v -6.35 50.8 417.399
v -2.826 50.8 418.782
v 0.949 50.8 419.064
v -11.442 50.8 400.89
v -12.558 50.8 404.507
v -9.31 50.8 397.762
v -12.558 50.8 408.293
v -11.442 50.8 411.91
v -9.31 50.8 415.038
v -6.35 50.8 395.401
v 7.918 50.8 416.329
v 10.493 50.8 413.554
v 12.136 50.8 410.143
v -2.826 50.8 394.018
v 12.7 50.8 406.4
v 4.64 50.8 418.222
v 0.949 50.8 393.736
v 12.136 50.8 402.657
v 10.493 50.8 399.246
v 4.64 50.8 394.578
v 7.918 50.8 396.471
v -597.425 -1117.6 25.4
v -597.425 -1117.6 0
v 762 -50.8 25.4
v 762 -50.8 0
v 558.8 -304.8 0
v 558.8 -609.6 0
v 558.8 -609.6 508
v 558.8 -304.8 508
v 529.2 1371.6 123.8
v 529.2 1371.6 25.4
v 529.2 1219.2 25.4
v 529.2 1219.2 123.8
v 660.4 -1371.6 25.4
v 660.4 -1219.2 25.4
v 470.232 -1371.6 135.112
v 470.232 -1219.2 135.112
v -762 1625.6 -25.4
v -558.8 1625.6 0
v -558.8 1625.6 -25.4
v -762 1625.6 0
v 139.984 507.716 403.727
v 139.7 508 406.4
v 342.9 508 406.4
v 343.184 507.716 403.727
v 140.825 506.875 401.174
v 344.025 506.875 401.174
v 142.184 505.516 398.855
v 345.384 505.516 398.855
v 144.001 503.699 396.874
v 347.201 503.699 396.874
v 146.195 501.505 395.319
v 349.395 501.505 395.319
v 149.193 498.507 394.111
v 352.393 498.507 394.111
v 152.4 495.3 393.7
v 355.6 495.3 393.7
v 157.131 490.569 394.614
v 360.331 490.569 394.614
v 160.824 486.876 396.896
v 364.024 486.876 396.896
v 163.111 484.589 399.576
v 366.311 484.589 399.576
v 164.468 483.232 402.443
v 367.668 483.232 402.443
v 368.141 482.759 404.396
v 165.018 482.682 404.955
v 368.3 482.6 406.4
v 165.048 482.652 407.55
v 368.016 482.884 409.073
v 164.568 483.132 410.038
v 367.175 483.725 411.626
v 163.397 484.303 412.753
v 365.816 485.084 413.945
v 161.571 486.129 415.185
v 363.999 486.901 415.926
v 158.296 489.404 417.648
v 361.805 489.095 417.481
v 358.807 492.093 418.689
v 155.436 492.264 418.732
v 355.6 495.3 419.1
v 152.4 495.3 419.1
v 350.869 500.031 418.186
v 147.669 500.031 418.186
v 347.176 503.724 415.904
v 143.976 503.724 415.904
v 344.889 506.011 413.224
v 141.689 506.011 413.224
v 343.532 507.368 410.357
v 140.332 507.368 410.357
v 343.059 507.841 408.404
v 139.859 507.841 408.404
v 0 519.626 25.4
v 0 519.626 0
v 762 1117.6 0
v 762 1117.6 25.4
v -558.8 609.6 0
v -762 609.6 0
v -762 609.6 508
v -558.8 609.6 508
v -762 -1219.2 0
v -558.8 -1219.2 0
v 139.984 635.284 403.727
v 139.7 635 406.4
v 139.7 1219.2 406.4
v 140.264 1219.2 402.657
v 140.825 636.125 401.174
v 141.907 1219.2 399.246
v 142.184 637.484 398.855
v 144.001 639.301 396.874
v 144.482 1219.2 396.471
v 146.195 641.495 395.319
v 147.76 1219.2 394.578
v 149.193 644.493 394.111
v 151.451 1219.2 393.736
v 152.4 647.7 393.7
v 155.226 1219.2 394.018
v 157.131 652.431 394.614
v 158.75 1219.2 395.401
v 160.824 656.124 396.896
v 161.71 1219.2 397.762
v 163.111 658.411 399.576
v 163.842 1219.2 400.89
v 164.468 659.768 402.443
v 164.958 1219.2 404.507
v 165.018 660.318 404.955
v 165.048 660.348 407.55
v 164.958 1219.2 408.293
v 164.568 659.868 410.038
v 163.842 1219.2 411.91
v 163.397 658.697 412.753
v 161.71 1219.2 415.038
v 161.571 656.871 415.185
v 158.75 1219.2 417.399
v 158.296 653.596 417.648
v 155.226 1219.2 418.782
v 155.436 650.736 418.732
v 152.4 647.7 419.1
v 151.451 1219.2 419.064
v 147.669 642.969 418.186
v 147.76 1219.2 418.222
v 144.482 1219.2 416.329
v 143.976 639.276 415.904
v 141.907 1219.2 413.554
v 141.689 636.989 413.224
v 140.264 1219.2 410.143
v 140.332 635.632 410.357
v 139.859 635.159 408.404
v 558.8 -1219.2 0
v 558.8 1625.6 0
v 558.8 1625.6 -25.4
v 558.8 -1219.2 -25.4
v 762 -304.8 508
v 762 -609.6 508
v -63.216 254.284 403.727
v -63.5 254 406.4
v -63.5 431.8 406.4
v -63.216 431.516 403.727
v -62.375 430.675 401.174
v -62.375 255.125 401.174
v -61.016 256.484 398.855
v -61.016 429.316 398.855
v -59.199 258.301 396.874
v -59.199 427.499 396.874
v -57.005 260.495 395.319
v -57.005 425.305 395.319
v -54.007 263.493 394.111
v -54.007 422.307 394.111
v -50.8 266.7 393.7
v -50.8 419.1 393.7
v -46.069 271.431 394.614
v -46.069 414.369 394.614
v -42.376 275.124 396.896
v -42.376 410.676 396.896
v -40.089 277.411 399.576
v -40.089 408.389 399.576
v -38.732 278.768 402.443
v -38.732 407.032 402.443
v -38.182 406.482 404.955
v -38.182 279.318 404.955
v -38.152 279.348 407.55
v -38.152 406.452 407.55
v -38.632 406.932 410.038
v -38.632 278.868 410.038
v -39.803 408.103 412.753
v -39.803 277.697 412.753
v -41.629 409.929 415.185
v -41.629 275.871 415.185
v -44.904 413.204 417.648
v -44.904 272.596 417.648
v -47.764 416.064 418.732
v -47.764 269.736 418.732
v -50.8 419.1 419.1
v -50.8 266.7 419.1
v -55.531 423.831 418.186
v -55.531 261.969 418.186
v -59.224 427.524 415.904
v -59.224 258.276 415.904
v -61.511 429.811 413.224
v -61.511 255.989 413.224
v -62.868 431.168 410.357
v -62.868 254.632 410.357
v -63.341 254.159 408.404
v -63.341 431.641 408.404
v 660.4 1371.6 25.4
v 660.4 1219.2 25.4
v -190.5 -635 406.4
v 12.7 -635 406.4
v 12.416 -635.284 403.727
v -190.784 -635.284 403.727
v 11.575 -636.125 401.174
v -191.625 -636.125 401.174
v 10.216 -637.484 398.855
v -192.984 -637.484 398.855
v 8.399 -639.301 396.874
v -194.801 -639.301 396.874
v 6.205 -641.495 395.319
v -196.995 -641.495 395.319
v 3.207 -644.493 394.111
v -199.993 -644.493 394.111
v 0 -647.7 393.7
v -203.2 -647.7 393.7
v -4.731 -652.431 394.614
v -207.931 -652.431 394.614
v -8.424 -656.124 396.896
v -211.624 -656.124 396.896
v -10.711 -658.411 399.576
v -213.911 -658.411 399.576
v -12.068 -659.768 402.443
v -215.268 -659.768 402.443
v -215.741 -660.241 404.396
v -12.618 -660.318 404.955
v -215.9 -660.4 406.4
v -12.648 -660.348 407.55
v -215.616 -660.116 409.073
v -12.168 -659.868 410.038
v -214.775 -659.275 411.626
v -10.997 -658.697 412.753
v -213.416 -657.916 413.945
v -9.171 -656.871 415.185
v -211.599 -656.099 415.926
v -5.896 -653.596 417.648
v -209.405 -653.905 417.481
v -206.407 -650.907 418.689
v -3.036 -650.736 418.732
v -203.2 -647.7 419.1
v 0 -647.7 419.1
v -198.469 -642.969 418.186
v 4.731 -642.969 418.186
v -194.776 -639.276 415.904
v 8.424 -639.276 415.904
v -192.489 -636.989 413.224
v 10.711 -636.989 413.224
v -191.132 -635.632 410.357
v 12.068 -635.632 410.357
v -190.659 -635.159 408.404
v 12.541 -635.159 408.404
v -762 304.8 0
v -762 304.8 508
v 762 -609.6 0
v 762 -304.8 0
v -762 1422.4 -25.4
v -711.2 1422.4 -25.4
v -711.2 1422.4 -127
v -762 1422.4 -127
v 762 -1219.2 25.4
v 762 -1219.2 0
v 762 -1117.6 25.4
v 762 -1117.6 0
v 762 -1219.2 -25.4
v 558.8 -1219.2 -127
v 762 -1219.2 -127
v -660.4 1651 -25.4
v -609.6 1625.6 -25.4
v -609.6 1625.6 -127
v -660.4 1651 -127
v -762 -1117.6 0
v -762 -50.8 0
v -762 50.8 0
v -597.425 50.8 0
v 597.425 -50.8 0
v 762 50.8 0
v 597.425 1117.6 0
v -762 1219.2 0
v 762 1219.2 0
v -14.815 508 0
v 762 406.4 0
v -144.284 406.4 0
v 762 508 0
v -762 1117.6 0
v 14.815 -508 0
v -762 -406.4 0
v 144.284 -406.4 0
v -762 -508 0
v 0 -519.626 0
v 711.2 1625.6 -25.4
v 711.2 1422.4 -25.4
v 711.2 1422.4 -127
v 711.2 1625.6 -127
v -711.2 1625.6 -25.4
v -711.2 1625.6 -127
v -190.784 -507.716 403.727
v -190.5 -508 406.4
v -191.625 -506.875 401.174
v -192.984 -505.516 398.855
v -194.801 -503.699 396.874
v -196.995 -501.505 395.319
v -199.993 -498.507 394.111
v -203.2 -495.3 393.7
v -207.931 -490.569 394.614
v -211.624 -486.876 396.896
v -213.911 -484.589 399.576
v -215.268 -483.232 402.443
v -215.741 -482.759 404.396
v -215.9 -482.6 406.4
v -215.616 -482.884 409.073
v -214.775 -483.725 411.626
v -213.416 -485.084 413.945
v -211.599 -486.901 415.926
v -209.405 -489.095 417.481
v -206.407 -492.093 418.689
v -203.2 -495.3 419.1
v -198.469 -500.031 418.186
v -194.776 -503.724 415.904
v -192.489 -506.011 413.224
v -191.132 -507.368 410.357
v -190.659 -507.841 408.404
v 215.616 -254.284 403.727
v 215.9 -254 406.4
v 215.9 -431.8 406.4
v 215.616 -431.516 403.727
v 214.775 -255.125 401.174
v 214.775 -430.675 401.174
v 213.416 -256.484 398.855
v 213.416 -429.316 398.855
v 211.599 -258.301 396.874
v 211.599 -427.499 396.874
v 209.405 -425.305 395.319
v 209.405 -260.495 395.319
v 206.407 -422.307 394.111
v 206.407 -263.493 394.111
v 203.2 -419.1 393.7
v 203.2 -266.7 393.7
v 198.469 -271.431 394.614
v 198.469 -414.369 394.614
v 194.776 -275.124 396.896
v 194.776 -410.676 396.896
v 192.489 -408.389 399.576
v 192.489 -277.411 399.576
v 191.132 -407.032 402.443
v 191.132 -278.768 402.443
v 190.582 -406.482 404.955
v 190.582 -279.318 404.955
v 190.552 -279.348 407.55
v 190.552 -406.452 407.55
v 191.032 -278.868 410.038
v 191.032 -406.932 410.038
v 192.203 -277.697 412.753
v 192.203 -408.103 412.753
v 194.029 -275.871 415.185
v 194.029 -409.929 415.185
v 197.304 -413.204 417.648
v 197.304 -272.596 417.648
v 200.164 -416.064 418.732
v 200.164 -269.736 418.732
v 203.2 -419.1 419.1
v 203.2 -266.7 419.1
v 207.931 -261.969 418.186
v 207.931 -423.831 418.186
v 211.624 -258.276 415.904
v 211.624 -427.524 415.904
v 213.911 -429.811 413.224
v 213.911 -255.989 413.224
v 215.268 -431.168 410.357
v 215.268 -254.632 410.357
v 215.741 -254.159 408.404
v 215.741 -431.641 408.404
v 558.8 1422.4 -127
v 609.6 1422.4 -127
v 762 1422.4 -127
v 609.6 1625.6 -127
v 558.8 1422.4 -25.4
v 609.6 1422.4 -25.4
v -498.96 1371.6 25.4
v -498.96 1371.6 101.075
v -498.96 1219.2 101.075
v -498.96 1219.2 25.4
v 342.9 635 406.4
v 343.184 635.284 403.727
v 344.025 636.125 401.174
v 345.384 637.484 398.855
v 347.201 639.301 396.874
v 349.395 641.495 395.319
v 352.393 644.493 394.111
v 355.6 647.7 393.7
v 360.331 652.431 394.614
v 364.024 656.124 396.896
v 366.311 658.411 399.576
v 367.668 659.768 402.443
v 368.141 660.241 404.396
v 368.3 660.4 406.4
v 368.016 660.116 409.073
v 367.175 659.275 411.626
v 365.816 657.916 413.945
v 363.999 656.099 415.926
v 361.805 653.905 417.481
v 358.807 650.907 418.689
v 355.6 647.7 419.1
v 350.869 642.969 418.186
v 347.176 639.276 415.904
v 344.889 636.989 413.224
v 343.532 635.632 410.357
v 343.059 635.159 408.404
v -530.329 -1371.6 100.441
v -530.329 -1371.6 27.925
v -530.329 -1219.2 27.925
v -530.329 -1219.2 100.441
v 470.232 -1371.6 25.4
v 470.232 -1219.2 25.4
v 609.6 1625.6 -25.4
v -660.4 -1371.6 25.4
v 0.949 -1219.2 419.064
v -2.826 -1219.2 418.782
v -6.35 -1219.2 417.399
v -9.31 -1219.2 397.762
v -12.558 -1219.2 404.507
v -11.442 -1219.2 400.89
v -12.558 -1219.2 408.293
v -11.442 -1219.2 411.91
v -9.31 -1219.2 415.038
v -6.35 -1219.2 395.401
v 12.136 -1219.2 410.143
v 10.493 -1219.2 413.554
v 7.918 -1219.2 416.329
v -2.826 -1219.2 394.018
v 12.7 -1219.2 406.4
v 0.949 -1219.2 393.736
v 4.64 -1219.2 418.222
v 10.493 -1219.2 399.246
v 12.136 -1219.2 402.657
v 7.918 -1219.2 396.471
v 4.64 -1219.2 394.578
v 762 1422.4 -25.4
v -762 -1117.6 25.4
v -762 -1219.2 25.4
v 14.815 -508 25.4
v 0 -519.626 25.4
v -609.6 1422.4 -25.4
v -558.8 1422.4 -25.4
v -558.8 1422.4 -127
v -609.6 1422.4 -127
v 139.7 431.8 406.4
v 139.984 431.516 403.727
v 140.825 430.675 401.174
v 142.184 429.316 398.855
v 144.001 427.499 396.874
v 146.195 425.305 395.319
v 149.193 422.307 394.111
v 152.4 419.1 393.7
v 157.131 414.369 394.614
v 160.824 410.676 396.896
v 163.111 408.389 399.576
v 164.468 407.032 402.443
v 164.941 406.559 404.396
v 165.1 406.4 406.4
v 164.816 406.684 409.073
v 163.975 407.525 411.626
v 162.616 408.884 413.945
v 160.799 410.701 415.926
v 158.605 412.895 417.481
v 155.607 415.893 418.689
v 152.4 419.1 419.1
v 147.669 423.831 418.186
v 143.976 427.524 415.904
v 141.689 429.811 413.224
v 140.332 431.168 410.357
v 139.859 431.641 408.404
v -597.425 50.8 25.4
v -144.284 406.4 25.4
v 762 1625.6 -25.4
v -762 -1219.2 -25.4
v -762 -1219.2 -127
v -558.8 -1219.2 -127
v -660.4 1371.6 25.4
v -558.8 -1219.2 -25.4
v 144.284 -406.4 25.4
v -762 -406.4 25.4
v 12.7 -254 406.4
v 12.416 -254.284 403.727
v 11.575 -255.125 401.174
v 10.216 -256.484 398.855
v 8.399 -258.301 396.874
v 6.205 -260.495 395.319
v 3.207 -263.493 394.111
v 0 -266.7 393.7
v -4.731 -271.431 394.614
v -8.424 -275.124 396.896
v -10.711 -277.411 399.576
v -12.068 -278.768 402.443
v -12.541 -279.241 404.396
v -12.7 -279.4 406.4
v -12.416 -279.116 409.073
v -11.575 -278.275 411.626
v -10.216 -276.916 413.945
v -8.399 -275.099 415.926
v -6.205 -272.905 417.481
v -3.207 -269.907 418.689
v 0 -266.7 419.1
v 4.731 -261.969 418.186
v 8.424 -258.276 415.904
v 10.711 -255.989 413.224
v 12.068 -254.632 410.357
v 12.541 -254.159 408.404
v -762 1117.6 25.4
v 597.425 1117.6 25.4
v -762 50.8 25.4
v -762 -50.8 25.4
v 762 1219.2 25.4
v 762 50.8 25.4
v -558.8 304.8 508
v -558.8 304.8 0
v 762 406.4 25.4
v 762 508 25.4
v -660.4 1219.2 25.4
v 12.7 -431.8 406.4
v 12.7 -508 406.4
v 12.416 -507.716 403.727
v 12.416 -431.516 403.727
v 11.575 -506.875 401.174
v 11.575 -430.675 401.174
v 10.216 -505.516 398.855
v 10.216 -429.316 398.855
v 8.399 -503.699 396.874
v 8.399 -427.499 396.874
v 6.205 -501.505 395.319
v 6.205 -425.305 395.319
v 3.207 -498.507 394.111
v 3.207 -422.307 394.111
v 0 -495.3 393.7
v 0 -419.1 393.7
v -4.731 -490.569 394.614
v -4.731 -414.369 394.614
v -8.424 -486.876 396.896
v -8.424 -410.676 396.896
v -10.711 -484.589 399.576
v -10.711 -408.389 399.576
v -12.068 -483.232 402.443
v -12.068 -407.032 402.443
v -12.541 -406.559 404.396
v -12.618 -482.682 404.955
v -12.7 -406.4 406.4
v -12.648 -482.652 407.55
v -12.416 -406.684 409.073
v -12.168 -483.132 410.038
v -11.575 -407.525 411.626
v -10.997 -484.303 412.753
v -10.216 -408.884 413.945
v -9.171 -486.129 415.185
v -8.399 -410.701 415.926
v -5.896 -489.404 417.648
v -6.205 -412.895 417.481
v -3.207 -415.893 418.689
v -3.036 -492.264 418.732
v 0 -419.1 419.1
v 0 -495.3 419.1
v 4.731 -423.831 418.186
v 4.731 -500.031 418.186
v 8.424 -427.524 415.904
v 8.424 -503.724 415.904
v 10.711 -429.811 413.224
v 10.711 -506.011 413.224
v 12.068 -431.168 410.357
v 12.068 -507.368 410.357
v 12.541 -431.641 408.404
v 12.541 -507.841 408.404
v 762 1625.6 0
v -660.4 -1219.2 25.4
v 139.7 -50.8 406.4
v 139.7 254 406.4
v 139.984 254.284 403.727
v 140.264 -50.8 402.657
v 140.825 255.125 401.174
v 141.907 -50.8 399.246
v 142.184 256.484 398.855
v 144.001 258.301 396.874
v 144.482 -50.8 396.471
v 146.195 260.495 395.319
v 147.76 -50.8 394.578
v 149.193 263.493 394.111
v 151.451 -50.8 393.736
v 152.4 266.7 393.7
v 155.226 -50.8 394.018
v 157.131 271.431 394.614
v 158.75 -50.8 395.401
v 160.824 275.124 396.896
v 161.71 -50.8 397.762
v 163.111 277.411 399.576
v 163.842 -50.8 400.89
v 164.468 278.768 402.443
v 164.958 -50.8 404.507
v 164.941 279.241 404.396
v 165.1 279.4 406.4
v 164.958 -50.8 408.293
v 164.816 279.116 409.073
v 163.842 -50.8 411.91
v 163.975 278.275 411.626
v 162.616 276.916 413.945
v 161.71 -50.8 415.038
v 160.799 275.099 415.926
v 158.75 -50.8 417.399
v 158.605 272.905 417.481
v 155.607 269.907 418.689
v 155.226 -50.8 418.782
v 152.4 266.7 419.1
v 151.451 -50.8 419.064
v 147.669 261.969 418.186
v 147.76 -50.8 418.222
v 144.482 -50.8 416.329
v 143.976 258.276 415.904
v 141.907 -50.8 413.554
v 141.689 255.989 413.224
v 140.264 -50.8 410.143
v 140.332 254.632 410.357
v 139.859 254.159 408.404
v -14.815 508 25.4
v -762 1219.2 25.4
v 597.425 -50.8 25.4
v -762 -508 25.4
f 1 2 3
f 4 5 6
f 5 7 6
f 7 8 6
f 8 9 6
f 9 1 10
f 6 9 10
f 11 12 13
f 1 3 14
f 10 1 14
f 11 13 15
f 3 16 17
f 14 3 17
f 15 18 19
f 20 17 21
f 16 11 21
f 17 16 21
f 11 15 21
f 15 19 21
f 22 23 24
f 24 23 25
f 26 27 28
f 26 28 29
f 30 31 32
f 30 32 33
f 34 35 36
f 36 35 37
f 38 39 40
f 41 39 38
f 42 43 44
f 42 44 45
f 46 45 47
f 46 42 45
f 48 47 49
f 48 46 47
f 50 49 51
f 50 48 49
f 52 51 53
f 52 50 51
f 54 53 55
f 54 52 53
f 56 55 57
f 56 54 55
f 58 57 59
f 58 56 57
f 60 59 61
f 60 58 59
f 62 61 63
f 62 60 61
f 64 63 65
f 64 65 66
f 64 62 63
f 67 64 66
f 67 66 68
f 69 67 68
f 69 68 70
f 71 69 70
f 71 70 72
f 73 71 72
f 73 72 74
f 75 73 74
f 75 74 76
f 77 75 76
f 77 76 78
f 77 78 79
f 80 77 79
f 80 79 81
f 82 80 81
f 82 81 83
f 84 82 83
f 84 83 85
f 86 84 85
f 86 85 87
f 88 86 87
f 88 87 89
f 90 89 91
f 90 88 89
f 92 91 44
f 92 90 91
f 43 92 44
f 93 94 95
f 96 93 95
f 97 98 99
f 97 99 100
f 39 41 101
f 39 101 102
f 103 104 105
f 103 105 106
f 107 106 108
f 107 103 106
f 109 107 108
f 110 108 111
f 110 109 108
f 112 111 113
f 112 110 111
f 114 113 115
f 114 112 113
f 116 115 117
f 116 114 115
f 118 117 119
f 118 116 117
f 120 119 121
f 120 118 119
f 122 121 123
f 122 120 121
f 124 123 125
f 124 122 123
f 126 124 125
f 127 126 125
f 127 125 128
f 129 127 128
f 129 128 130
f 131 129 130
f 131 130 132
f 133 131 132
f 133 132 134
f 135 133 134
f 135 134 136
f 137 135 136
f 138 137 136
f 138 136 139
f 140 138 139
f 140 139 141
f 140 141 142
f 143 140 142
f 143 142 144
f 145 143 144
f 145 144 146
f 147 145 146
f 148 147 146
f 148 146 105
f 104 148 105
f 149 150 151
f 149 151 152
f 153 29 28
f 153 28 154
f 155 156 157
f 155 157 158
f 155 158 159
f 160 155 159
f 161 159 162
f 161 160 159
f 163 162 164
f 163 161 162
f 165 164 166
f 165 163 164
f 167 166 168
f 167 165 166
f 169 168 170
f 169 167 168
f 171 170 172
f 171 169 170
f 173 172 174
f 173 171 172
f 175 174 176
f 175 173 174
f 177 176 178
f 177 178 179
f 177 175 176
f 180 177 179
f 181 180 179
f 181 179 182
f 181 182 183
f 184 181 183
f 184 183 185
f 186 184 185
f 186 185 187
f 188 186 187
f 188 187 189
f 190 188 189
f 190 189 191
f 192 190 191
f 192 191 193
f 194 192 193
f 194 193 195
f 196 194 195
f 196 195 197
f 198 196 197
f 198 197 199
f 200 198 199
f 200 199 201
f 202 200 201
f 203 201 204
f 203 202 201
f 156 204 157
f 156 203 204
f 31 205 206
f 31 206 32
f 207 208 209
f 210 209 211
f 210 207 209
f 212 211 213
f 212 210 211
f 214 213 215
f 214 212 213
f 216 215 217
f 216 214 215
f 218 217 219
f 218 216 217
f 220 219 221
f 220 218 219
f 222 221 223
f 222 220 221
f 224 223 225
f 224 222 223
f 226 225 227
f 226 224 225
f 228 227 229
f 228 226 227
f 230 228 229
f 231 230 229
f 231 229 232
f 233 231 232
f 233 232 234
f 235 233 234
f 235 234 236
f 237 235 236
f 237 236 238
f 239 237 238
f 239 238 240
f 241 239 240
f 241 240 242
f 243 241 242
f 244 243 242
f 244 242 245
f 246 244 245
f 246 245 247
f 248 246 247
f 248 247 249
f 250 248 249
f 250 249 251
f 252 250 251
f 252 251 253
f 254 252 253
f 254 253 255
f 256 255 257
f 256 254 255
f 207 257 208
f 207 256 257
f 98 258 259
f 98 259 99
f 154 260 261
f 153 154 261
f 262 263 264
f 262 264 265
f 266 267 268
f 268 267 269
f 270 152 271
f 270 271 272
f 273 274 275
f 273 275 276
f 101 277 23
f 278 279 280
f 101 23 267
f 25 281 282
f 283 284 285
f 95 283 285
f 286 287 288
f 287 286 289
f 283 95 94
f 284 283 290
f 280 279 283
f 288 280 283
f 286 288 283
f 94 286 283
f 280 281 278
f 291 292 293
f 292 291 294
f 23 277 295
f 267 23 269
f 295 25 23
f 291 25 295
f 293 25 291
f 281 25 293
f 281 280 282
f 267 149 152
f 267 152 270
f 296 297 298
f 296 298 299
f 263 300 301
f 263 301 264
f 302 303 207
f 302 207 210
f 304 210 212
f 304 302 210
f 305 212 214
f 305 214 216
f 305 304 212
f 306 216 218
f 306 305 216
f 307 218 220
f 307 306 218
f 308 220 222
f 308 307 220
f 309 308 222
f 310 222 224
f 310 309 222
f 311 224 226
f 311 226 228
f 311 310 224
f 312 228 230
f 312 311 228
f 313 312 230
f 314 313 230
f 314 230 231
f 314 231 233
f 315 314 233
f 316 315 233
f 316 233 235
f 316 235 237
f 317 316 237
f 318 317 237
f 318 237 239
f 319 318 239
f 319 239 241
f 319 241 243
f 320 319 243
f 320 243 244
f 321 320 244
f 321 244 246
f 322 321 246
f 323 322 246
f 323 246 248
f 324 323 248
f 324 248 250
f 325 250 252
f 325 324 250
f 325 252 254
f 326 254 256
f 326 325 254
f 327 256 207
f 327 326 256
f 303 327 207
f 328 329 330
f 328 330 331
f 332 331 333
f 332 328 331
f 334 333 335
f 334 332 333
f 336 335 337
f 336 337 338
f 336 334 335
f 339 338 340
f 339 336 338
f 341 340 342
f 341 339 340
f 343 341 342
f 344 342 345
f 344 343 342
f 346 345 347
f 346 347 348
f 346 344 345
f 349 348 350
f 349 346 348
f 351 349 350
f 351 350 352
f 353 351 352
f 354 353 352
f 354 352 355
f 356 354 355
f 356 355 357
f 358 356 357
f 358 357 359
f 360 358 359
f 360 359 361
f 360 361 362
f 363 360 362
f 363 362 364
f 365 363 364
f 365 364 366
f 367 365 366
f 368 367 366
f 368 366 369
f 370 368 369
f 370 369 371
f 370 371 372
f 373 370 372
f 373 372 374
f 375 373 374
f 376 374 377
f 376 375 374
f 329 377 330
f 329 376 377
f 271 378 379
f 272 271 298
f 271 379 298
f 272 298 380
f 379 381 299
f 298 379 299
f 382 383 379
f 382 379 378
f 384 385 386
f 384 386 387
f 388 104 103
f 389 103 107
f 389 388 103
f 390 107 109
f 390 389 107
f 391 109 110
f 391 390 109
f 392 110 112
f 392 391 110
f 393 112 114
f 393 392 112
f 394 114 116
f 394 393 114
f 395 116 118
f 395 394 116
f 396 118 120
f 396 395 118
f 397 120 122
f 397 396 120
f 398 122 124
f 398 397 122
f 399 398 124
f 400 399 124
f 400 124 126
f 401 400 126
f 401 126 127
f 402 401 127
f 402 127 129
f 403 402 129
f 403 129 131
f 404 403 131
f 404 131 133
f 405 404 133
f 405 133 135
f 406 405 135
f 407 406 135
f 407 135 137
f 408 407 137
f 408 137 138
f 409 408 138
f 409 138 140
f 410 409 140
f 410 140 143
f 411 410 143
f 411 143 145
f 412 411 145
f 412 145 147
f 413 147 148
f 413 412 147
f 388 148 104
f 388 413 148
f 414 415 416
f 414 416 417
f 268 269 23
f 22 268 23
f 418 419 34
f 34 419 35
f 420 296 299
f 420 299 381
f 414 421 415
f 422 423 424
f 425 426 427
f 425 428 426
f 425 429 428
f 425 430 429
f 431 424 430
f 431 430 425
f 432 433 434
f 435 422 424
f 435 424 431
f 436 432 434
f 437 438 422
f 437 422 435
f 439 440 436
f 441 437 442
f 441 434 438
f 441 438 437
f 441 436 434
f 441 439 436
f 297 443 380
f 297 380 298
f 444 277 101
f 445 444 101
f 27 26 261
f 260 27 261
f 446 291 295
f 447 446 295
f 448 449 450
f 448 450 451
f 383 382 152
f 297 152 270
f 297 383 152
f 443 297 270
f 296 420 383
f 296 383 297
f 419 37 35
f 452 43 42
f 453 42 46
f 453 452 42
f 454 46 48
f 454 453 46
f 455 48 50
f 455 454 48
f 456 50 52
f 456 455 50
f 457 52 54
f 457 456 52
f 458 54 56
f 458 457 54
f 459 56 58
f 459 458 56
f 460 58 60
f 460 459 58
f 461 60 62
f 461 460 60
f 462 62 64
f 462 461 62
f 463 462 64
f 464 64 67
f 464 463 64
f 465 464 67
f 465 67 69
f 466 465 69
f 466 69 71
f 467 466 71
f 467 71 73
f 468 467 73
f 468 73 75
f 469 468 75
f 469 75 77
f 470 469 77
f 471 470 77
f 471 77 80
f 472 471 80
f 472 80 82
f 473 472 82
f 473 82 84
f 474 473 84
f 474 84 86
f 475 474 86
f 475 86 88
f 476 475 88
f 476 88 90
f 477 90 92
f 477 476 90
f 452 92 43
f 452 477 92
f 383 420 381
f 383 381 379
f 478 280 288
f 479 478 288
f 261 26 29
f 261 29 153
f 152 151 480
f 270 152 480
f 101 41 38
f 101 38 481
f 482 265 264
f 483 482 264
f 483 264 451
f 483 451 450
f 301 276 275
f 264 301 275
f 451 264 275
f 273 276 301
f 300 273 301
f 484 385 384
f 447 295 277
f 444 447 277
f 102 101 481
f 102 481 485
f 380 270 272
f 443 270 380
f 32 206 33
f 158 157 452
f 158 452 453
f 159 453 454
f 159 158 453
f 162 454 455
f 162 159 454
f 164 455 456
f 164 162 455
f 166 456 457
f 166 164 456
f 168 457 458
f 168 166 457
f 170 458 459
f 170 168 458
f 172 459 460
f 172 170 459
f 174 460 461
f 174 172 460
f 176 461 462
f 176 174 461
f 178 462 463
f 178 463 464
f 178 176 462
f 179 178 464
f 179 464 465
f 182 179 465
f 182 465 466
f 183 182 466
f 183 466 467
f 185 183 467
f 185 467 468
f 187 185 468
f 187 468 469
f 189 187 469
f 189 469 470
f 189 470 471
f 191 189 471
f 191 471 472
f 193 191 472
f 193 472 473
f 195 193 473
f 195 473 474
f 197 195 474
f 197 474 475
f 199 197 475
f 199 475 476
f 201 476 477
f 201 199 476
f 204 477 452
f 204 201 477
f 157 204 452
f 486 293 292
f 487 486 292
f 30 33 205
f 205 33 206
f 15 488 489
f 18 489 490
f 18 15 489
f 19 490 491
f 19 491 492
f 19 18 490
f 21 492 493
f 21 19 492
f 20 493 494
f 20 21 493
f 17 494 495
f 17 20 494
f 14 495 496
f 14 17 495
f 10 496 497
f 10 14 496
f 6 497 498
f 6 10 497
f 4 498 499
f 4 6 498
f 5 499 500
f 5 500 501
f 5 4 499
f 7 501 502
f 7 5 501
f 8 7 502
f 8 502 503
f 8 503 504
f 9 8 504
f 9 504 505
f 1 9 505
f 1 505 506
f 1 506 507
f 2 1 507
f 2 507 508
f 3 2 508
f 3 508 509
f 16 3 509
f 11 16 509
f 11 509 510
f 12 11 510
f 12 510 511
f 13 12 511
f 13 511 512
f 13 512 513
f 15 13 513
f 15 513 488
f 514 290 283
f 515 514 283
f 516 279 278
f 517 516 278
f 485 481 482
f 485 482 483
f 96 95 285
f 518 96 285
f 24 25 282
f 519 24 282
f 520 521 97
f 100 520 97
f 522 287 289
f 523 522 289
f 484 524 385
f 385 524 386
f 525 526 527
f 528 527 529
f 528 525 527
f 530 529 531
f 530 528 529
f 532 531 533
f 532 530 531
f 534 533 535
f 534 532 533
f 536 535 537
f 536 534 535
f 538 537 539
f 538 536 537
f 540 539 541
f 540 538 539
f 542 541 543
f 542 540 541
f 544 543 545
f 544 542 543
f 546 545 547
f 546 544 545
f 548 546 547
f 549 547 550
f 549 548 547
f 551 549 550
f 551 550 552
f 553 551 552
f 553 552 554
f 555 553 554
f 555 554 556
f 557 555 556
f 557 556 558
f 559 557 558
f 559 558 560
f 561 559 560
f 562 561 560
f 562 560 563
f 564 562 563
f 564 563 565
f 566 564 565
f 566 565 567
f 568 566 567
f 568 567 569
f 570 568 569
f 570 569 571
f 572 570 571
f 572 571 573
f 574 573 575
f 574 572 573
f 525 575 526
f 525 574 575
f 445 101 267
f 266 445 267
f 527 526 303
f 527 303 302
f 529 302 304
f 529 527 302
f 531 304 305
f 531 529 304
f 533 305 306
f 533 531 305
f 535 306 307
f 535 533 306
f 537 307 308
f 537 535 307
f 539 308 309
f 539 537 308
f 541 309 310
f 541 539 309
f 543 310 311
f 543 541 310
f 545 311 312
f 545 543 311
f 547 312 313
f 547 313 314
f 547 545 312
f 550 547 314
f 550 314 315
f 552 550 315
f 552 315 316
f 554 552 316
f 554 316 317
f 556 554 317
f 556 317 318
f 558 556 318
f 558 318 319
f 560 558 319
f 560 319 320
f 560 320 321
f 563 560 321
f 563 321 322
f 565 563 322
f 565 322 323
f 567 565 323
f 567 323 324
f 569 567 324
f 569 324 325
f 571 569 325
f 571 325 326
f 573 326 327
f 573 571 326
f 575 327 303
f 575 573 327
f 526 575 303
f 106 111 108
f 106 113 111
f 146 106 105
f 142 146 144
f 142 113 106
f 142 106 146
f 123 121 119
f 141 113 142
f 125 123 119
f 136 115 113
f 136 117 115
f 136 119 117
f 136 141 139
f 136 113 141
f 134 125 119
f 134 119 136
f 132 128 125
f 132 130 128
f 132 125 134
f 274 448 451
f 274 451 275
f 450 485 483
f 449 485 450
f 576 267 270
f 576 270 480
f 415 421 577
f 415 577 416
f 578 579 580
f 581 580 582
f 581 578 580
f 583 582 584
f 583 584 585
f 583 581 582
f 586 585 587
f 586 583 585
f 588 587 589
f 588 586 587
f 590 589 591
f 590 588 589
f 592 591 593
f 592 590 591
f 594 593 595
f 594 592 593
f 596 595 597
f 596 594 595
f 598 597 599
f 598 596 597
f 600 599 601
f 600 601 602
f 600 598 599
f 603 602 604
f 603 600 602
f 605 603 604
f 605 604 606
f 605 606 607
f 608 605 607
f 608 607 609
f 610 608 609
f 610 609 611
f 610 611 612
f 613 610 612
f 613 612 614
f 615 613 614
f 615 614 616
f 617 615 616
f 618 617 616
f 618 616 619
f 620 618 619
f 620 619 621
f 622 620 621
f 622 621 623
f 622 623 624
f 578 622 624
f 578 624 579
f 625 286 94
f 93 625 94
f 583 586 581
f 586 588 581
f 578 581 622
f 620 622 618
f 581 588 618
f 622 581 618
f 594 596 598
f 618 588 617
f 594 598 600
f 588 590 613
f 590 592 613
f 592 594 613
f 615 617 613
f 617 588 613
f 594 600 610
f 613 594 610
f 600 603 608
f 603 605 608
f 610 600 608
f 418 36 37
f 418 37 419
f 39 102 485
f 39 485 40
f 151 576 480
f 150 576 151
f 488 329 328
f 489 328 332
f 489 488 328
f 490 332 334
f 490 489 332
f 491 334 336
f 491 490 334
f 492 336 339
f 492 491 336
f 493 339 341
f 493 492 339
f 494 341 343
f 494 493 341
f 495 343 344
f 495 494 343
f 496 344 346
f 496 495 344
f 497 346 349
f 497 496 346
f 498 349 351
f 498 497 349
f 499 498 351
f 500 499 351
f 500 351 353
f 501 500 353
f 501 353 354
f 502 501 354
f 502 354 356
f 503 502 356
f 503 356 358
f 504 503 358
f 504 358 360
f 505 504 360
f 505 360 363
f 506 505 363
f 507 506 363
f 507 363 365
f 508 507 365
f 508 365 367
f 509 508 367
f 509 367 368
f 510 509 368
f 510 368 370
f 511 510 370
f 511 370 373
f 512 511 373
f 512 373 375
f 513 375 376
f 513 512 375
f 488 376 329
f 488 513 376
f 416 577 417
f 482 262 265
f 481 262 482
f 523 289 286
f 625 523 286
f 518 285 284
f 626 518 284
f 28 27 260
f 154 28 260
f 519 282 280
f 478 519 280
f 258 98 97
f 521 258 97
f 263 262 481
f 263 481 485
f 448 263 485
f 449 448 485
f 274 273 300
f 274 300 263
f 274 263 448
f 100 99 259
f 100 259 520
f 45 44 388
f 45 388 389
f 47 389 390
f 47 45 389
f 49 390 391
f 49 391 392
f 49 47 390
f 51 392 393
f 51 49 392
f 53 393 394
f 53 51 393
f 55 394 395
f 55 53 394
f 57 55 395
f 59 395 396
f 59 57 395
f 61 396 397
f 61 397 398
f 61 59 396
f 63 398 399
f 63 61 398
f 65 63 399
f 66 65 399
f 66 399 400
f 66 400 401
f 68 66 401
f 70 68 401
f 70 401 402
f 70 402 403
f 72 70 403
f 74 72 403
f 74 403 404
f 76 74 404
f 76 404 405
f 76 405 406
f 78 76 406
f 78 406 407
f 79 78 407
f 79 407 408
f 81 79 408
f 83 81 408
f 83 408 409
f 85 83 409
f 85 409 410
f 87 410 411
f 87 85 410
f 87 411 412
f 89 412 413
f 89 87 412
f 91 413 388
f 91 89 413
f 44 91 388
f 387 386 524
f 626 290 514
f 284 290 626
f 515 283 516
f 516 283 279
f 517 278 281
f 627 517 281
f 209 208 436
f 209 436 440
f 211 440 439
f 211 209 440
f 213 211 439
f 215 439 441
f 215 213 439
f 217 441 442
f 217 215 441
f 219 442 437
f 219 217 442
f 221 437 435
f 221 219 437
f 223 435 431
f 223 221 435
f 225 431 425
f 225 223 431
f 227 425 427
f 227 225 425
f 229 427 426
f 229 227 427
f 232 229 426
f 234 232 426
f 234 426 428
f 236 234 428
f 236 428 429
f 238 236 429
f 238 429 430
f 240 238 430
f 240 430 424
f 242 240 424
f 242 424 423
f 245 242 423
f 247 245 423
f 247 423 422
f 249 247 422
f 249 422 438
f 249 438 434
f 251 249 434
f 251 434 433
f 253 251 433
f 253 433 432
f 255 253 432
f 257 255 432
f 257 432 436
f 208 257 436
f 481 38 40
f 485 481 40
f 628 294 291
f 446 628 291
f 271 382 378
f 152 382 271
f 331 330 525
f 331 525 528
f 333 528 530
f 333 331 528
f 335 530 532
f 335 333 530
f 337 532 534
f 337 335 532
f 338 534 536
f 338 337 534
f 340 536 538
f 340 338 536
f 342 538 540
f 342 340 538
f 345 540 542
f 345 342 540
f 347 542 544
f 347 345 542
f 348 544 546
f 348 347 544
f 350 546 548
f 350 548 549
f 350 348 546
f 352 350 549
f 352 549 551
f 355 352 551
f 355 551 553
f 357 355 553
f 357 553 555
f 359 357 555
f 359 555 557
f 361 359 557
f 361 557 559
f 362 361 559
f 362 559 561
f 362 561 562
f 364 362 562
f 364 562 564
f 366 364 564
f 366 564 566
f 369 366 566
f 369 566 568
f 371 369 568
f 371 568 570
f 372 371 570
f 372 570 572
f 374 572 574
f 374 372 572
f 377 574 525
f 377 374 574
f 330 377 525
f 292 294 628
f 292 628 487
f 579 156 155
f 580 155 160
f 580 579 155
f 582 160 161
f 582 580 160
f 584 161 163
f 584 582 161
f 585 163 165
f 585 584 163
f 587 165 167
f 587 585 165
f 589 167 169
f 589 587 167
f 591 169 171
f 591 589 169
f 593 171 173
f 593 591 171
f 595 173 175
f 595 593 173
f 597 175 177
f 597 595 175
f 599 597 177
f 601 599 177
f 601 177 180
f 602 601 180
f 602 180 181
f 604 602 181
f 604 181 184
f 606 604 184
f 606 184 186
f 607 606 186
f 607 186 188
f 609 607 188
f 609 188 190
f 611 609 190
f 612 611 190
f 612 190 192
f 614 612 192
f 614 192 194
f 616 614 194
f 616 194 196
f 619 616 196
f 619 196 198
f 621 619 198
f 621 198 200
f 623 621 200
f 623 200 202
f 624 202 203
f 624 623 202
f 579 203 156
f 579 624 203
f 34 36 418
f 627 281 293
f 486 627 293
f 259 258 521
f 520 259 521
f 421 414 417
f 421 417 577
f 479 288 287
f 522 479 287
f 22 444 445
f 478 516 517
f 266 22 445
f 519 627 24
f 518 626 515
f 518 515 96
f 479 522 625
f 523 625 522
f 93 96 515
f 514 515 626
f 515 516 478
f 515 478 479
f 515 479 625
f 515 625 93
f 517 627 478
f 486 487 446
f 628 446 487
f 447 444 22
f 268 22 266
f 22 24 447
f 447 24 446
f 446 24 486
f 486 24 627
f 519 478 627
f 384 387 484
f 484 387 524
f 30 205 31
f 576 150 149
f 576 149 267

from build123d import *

# Parameters (mm, degrees)
F2_START  = -25.4
F1_W      = 203.2
F1_H      = 304.8
F1_H_2    = 1524
F2_DEPTH  = 101.6
F1_H_3    = 609.6
F3_DEPTH  = 508
F4_DEPTH  = 508
F1_W_2    = 50.8
F1_H_4    = 203.2
F6_DEPTH  = 25.4
F7_W      = 558.8
F7_H      = 101.6
F7_W_2    = 203.2
F8_DEPTH  = 25.4
F11_R     = 12.7
F13_R     = 12.7
F15_DEPTH = 152.4
F16_DEPTH = 152.4


with BuildPart() as f2:
    # F1 (on Top) → F2 (new body)
    with BuildSketch(Plane.XY.offset(F2_START)):
        Polygon((-762, 1422.4), (-762, 1219.2), (-660.4, 1219.2), (-660.4, 1422.4), (-711.2, 1422.4), align=None)
        Polygon((-660.4, 1219.2), (-762, 1219.2), (-762, 609.6), (-558.8, 609.6), (-558.8, 1219.2), align=None)
        Polygon((-660.4, 1422.4), (-660.4, 1219.2), (-558.8, 1219.2), (-558.8, 1422.4), (-609.6, 1422.4), align=None)
        with Locations((-660.4, 457.2)):
            Rectangle(F1_W, F1_H)
        Polygon((-711.2, 1422.4), (-660.4, 1422.4), (-609.6, 1422.4), (-609.6, 1625.6), (-711.2, 1625.6), align=None)
        with Locations((-660.4, -457.2)):
            Rectangle(F1_W, F1_H_2)
        Polygon((-660.4, 1651), (-711.2, 1625.6), (-609.6, 1625.6), align=None)
    extrude(amount=-F2_DEPTH)


with BuildPart() as f2b:
    # F1 (on Top) → F2, piece 2 (new body)
    with BuildSketch(Plane.XY.offset(F2_START)):
        Polygon((660.4, 1219.2), (558.8, 1219.2), (558.8, -304.8), (762, -304.8), (762, 1219.2), align=None)
        Polygon((558.8, 1422.4), (558.8, 1219.2), (660.4, 1219.2), (660.4, 1422.4), (609.6, 1422.4), align=None)
        with Locations((660.4, -457.2)):
            Rectangle(F1_W, F1_H)
        Polygon((660.4, 1422.4), (660.4, 1219.2), (762, 1219.2), (762, 1422.4), (711.2, 1422.4), align=None)
        with Locations((660.4, -914.4)):
            Rectangle(F1_W, F1_H_3)
        Polygon((609.6, 1422.4), (660.4, 1422.4), (711.2, 1422.4), (711.2, 1625.6), (609.6, 1625.6), align=None)
    extrude(amount=-F2_DEPTH)


with BuildPart() as f3:
    # F1 (on Top) → F3 (new body)
    with BuildSketch(Plane.XY):
        with Locations((-660.4, 457.2)):
            Rectangle(F1_W, F1_H)
    extrude(amount=F3_DEPTH)


with BuildPart() as f4:
    # F1 (on Top) → F4 (new body)
    with BuildSketch(Plane.XY):
        with Locations((660.4, -457.2)):
            Rectangle(F1_W, F1_H)
    extrude(amount=F4_DEPTH)


with BuildPart() as f6:
    # F1 (on Top) → F6 (new body)
    with BuildSketch(Plane.XY):
        with Locations((-736.6, 1524)):
            Rectangle(F1_W_2, F1_H_4)
        Polygon((-711.2, 1422.4), (-660.4, 1422.4), (-609.6, 1422.4), (-609.6, 1625.6), (-711.2, 1625.6), align=None)
        with Locations((-584.2, 1524)):
            Rectangle(F1_W_2, F1_H_4)
        Polygon((-660.4, 1422.4), (-660.4, 1219.2), (-558.8, 1219.2), (-558.8, 1422.4), (-609.6, 1422.4), align=None)
        Polygon((-762, 1422.4), (-762, 1219.2), (-660.4, 1219.2), (-660.4, 1422.4), (-711.2, 1422.4), align=None)
        Polygon((-660.4, 1219.2), (-762, 1219.2), (-762, 609.6), (-558.8, 609.6), (-558.8, 1219.2), align=None)
        with Locations((-660.4, -457.2)):
            Rectangle(F1_W, F1_H_2)
        with Locations((-660.4, 457.2)):
            Rectangle(F1_W, F1_H)
    extrude(amount=-F6_DEPTH)


with BuildPart() as f6b:
    # F1 (on Top) → F6, piece 2 (new body)
    with BuildSketch(Plane.XY):
        Polygon((660.4, 1219.2), (558.8, 1219.2), (558.8, -304.8), (762, -304.8), (762, 1219.2), align=None)
        with Locations((660.4, -914.4)):
            Rectangle(F1_W, F1_H_3)
        with Locations((584.2, 1524)):
            Rectangle(F1_W_2, F1_H_4)
        Polygon((609.6, 1422.4), (660.4, 1422.4), (711.2, 1422.4), (711.2, 1625.6), (609.6, 1625.6), align=None)
        with Locations((736.6, 1524)):
            Rectangle(F1_W_2, F1_H_4)
        Polygon((660.4, 1422.4), (660.4, 1219.2), (762, 1219.2), (762, 1422.4), (711.2, 1422.4), align=None)
        Polygon((558.8, 1422.4), (558.8, 1219.2), (660.4, 1219.2), (660.4, 1422.4), (609.6, 1422.4), align=None)
        with Locations((660.4, -457.2)):
            Rectangle(F1_W, F1_H)
    extrude(amount=-F6_DEPTH)


with BuildPart() as f8:
    # F7 (on Top) → F8 (new body)
    with BuildSketch(Plane.XY):
        Polygon((0, 648.7744153468), (-558.8, 210.2598440925), (-558.8, 81.111013399), (-144.2835902197, 406.4), (-14.8145059026, 508), (0, 519.6255846532), align=None)
        Polygon((-558.8, 210.2598440925), (-762, 50.8), (-597.4253853296, 50.8), (-558.8, 81.111013399), align=None)
        Polygon((558.8, 1087.288986601), (0, 648.7744153468), (0, 519.6255846532), (558.8, 958.1401559075), align=None)
        Polygon((597.4253853296, 1117.6), (558.8, 1087.288986601), (558.8, 958.1401559075), (762, 1117.6), align=None)
        Polygon((762, 1219.2), (558.8, 1219.2), (558.8, 1117.6), (597.4253853296, 1117.6), (762, 1117.6), align=None)
        with Locations((279.4, 1168.4)):
            Rectangle(F7_W, F7_H)
        with Locations((-279.4, 1168.4)):
            Rectangle(F7_W, F7_H)
        with Locations((-660.4, 1168.4)):
            Rectangle(F7_W_2, F7_H)
        with Locations((-279.4, 0)):
            Rectangle(F7_W, F7_H)
        Polygon((-597.4253853296, 50.8), (-762, 50.8), (-762, -50.8), (-558.8, -50.8), (-558.8, 50.8), align=None)
        with Locations((279.4, 0)):
            Rectangle(F7_W, F7_H)
        Polygon((558.8, 50.8), (558.8, -50.8), (597.4253853296, -50.8), (762, -50.8), (762, 50.8), align=None)
        Polygon((558.8, -81.111013399), (144.2835902197, -406.4), (14.8145059026, -508), (0, -519.6255846533), (0, -648.7744153467), (558.8, -210.2598440925), align=None)
        Polygon((597.4253853296, -50.8), (558.8, -81.111013399), (558.8, -210.2598440925), (762, -50.8), align=None)
        Polygon((0, -519.6255846533), (-558.8, -958.1401559075), (-558.8, -1087.288986601), (0, -648.7744153467), align=None)
        Polygon((-558.8, -958.1401559075), (-762, -1117.6), (-597.4253853296, -1117.6), (-558.8, -1087.288986601), align=None)
        with Locations((-279.4, -1168.4)):
            Rectangle(F7_W, F7_H)
        Polygon((-597.4253853296, -1117.6), (-762, -1117.6), (-762, -1219.2), (-558.8, -1219.2), (-558.8, -1117.6), align=None)
        with Locations((279.4, -1168.4)):
            Rectangle(F7_W, F7_H)
        with Locations((660.4, -1168.4)):
            Rectangle(F7_W_2, F7_H)
        with Locations((-279.4, -457.2)):
            Rectangle(F7_W, F7_H)
        with Locations((-660.4, -457.2)):
            Rectangle(F7_W_2, F7_H)
        Polygon((144.2835902197, -406.4), (0, -406.4), (0, -508), (14.8145059026, -508), align=None)
        Polygon((-14.8145059026, 508), (-144.2835902197, 406.4), (0, 406.4), (0, 508), align=None)
        with Locations((660.4, 457.2)):
            Rectangle(F7_W_2, F7_H)
        with Locations((279.4, 457.2)):
            Rectangle(F7_W, F7_H)
    extrude(amount=F8_DEPTH)


with BuildPart() as f12:
    # F12: sweep along a path in F5
    with BuildLine(Plane.XY.offset(406.4)) as f12_path:
        Line((152.4, 1219.2), (152.4, 647.7))
        Line((152.4, 647.7), (355.6, 647.7))
        Line((355.6, 647.7), (355.6, 495.3))
        Line((355.6, 495.3), (152.4, 495.3))
        Line((152.4, 495.3), (152.4, 419.1))
        Line((152.4, 419.1), (-50.8, 419.1))
        Line((-50.8, 419.1), (-50.8, 266.7))
        Line((-50.8, 266.7), (152.4, 266.7))
        Line((152.4, 266.7), (152.4, -50.8))
    # F11 (on offset) → F12 (sweep)
    with BuildSketch(Plane(origin=(0, 1219.2, 0), x_dir=(-1, 0, 0), z_dir=(0, 1, 0))):
        with Locations((-152.4, 406.4)):
            Circle(F11_R)
    sweep(path=f12_path.line, transition=Transition.RIGHT)


with BuildPart() as f14:
    # F14: sweep along a path in F5
    with BuildLine(Plane.XY.offset(406.4)) as f14_path:
        Line((0, -1219.2), (0, -647.7))
        Line((0, -647.7), (-203.2, -647.7))
        Line((-203.2, -647.7), (-203.2, -495.3))
        Line((-203.2, -495.3), (0, -495.3))
        Line((0, -495.3), (0, -419.1))
        Line((0, -419.1), (203.2, -419.1))
        Line((203.2, -419.1), (203.2, -266.7))
        Line((203.2, -266.7), (0, -266.7))
        Line((0, -266.7), (0, 50.8))
    # F13 (on offset) → F14 (sweep)
    with BuildSketch(Plane.XZ.offset(1219.2)):
        with Locations((0, 406.4)):
            Circle(F13_R)
    sweep(path=f14_path.line, transition=Transition.RIGHT)


with BuildPart() as f15:
    # F13 (on offset) → F15 (new body)
    with BuildSketch(Plane.XZ.offset(1219.2)):
        Polygon((-530.3294147081, 27.9253141867), (-530.3294147081, 100.4407222838), (-660.4, 25.4), align=None)
    extrude(amount=F15_DEPTH)


with BuildPart() as f15b:
    # F13 (on offset) → F15, piece 2 (new body)
    with BuildSketch(Plane.XZ.offset(1219.2)):
        Polygon((660.4, 25.4), (470.2320303052, 135.1122902086), (470.2320303052, 25.4), align=None)
    extrude(amount=F15_DEPTH)


with BuildPart() as f16:
    # F11 (on offset) → F16 (new body)
    with BuildSketch(Plane(origin=(0, 1219.2, 0), x_dir=(-1, 0, 0), z_dir=(0, 1, 0))):
        Polygon((-529.2000174522, 123.7999869108), (-660.4, 25.4), (-529.2000174522, 25.4), align=None)
    extrude(amount=F16_DEPTH)


with BuildPart() as f16b:
    # F11 (on offset) → F16, piece 2 (new body)
    with BuildSketch(Plane(origin=(0, 1219.2, 0), x_dir=(-1, 0, 0), z_dir=(0, 1, 0))):
        Polygon((498.9599585533, 25.4), (660.4, 25.4), (498.9599585533, 101.0750194281), align=None)
    extrude(amount=F16_DEPTH)


solid = Compound([f2.part, f2b.part, f3.part, f4.part, f6.part, f6b.part, f8.part, f12.part, f14.part, f15.part, f15b.part, f16.part, f16b.part])
